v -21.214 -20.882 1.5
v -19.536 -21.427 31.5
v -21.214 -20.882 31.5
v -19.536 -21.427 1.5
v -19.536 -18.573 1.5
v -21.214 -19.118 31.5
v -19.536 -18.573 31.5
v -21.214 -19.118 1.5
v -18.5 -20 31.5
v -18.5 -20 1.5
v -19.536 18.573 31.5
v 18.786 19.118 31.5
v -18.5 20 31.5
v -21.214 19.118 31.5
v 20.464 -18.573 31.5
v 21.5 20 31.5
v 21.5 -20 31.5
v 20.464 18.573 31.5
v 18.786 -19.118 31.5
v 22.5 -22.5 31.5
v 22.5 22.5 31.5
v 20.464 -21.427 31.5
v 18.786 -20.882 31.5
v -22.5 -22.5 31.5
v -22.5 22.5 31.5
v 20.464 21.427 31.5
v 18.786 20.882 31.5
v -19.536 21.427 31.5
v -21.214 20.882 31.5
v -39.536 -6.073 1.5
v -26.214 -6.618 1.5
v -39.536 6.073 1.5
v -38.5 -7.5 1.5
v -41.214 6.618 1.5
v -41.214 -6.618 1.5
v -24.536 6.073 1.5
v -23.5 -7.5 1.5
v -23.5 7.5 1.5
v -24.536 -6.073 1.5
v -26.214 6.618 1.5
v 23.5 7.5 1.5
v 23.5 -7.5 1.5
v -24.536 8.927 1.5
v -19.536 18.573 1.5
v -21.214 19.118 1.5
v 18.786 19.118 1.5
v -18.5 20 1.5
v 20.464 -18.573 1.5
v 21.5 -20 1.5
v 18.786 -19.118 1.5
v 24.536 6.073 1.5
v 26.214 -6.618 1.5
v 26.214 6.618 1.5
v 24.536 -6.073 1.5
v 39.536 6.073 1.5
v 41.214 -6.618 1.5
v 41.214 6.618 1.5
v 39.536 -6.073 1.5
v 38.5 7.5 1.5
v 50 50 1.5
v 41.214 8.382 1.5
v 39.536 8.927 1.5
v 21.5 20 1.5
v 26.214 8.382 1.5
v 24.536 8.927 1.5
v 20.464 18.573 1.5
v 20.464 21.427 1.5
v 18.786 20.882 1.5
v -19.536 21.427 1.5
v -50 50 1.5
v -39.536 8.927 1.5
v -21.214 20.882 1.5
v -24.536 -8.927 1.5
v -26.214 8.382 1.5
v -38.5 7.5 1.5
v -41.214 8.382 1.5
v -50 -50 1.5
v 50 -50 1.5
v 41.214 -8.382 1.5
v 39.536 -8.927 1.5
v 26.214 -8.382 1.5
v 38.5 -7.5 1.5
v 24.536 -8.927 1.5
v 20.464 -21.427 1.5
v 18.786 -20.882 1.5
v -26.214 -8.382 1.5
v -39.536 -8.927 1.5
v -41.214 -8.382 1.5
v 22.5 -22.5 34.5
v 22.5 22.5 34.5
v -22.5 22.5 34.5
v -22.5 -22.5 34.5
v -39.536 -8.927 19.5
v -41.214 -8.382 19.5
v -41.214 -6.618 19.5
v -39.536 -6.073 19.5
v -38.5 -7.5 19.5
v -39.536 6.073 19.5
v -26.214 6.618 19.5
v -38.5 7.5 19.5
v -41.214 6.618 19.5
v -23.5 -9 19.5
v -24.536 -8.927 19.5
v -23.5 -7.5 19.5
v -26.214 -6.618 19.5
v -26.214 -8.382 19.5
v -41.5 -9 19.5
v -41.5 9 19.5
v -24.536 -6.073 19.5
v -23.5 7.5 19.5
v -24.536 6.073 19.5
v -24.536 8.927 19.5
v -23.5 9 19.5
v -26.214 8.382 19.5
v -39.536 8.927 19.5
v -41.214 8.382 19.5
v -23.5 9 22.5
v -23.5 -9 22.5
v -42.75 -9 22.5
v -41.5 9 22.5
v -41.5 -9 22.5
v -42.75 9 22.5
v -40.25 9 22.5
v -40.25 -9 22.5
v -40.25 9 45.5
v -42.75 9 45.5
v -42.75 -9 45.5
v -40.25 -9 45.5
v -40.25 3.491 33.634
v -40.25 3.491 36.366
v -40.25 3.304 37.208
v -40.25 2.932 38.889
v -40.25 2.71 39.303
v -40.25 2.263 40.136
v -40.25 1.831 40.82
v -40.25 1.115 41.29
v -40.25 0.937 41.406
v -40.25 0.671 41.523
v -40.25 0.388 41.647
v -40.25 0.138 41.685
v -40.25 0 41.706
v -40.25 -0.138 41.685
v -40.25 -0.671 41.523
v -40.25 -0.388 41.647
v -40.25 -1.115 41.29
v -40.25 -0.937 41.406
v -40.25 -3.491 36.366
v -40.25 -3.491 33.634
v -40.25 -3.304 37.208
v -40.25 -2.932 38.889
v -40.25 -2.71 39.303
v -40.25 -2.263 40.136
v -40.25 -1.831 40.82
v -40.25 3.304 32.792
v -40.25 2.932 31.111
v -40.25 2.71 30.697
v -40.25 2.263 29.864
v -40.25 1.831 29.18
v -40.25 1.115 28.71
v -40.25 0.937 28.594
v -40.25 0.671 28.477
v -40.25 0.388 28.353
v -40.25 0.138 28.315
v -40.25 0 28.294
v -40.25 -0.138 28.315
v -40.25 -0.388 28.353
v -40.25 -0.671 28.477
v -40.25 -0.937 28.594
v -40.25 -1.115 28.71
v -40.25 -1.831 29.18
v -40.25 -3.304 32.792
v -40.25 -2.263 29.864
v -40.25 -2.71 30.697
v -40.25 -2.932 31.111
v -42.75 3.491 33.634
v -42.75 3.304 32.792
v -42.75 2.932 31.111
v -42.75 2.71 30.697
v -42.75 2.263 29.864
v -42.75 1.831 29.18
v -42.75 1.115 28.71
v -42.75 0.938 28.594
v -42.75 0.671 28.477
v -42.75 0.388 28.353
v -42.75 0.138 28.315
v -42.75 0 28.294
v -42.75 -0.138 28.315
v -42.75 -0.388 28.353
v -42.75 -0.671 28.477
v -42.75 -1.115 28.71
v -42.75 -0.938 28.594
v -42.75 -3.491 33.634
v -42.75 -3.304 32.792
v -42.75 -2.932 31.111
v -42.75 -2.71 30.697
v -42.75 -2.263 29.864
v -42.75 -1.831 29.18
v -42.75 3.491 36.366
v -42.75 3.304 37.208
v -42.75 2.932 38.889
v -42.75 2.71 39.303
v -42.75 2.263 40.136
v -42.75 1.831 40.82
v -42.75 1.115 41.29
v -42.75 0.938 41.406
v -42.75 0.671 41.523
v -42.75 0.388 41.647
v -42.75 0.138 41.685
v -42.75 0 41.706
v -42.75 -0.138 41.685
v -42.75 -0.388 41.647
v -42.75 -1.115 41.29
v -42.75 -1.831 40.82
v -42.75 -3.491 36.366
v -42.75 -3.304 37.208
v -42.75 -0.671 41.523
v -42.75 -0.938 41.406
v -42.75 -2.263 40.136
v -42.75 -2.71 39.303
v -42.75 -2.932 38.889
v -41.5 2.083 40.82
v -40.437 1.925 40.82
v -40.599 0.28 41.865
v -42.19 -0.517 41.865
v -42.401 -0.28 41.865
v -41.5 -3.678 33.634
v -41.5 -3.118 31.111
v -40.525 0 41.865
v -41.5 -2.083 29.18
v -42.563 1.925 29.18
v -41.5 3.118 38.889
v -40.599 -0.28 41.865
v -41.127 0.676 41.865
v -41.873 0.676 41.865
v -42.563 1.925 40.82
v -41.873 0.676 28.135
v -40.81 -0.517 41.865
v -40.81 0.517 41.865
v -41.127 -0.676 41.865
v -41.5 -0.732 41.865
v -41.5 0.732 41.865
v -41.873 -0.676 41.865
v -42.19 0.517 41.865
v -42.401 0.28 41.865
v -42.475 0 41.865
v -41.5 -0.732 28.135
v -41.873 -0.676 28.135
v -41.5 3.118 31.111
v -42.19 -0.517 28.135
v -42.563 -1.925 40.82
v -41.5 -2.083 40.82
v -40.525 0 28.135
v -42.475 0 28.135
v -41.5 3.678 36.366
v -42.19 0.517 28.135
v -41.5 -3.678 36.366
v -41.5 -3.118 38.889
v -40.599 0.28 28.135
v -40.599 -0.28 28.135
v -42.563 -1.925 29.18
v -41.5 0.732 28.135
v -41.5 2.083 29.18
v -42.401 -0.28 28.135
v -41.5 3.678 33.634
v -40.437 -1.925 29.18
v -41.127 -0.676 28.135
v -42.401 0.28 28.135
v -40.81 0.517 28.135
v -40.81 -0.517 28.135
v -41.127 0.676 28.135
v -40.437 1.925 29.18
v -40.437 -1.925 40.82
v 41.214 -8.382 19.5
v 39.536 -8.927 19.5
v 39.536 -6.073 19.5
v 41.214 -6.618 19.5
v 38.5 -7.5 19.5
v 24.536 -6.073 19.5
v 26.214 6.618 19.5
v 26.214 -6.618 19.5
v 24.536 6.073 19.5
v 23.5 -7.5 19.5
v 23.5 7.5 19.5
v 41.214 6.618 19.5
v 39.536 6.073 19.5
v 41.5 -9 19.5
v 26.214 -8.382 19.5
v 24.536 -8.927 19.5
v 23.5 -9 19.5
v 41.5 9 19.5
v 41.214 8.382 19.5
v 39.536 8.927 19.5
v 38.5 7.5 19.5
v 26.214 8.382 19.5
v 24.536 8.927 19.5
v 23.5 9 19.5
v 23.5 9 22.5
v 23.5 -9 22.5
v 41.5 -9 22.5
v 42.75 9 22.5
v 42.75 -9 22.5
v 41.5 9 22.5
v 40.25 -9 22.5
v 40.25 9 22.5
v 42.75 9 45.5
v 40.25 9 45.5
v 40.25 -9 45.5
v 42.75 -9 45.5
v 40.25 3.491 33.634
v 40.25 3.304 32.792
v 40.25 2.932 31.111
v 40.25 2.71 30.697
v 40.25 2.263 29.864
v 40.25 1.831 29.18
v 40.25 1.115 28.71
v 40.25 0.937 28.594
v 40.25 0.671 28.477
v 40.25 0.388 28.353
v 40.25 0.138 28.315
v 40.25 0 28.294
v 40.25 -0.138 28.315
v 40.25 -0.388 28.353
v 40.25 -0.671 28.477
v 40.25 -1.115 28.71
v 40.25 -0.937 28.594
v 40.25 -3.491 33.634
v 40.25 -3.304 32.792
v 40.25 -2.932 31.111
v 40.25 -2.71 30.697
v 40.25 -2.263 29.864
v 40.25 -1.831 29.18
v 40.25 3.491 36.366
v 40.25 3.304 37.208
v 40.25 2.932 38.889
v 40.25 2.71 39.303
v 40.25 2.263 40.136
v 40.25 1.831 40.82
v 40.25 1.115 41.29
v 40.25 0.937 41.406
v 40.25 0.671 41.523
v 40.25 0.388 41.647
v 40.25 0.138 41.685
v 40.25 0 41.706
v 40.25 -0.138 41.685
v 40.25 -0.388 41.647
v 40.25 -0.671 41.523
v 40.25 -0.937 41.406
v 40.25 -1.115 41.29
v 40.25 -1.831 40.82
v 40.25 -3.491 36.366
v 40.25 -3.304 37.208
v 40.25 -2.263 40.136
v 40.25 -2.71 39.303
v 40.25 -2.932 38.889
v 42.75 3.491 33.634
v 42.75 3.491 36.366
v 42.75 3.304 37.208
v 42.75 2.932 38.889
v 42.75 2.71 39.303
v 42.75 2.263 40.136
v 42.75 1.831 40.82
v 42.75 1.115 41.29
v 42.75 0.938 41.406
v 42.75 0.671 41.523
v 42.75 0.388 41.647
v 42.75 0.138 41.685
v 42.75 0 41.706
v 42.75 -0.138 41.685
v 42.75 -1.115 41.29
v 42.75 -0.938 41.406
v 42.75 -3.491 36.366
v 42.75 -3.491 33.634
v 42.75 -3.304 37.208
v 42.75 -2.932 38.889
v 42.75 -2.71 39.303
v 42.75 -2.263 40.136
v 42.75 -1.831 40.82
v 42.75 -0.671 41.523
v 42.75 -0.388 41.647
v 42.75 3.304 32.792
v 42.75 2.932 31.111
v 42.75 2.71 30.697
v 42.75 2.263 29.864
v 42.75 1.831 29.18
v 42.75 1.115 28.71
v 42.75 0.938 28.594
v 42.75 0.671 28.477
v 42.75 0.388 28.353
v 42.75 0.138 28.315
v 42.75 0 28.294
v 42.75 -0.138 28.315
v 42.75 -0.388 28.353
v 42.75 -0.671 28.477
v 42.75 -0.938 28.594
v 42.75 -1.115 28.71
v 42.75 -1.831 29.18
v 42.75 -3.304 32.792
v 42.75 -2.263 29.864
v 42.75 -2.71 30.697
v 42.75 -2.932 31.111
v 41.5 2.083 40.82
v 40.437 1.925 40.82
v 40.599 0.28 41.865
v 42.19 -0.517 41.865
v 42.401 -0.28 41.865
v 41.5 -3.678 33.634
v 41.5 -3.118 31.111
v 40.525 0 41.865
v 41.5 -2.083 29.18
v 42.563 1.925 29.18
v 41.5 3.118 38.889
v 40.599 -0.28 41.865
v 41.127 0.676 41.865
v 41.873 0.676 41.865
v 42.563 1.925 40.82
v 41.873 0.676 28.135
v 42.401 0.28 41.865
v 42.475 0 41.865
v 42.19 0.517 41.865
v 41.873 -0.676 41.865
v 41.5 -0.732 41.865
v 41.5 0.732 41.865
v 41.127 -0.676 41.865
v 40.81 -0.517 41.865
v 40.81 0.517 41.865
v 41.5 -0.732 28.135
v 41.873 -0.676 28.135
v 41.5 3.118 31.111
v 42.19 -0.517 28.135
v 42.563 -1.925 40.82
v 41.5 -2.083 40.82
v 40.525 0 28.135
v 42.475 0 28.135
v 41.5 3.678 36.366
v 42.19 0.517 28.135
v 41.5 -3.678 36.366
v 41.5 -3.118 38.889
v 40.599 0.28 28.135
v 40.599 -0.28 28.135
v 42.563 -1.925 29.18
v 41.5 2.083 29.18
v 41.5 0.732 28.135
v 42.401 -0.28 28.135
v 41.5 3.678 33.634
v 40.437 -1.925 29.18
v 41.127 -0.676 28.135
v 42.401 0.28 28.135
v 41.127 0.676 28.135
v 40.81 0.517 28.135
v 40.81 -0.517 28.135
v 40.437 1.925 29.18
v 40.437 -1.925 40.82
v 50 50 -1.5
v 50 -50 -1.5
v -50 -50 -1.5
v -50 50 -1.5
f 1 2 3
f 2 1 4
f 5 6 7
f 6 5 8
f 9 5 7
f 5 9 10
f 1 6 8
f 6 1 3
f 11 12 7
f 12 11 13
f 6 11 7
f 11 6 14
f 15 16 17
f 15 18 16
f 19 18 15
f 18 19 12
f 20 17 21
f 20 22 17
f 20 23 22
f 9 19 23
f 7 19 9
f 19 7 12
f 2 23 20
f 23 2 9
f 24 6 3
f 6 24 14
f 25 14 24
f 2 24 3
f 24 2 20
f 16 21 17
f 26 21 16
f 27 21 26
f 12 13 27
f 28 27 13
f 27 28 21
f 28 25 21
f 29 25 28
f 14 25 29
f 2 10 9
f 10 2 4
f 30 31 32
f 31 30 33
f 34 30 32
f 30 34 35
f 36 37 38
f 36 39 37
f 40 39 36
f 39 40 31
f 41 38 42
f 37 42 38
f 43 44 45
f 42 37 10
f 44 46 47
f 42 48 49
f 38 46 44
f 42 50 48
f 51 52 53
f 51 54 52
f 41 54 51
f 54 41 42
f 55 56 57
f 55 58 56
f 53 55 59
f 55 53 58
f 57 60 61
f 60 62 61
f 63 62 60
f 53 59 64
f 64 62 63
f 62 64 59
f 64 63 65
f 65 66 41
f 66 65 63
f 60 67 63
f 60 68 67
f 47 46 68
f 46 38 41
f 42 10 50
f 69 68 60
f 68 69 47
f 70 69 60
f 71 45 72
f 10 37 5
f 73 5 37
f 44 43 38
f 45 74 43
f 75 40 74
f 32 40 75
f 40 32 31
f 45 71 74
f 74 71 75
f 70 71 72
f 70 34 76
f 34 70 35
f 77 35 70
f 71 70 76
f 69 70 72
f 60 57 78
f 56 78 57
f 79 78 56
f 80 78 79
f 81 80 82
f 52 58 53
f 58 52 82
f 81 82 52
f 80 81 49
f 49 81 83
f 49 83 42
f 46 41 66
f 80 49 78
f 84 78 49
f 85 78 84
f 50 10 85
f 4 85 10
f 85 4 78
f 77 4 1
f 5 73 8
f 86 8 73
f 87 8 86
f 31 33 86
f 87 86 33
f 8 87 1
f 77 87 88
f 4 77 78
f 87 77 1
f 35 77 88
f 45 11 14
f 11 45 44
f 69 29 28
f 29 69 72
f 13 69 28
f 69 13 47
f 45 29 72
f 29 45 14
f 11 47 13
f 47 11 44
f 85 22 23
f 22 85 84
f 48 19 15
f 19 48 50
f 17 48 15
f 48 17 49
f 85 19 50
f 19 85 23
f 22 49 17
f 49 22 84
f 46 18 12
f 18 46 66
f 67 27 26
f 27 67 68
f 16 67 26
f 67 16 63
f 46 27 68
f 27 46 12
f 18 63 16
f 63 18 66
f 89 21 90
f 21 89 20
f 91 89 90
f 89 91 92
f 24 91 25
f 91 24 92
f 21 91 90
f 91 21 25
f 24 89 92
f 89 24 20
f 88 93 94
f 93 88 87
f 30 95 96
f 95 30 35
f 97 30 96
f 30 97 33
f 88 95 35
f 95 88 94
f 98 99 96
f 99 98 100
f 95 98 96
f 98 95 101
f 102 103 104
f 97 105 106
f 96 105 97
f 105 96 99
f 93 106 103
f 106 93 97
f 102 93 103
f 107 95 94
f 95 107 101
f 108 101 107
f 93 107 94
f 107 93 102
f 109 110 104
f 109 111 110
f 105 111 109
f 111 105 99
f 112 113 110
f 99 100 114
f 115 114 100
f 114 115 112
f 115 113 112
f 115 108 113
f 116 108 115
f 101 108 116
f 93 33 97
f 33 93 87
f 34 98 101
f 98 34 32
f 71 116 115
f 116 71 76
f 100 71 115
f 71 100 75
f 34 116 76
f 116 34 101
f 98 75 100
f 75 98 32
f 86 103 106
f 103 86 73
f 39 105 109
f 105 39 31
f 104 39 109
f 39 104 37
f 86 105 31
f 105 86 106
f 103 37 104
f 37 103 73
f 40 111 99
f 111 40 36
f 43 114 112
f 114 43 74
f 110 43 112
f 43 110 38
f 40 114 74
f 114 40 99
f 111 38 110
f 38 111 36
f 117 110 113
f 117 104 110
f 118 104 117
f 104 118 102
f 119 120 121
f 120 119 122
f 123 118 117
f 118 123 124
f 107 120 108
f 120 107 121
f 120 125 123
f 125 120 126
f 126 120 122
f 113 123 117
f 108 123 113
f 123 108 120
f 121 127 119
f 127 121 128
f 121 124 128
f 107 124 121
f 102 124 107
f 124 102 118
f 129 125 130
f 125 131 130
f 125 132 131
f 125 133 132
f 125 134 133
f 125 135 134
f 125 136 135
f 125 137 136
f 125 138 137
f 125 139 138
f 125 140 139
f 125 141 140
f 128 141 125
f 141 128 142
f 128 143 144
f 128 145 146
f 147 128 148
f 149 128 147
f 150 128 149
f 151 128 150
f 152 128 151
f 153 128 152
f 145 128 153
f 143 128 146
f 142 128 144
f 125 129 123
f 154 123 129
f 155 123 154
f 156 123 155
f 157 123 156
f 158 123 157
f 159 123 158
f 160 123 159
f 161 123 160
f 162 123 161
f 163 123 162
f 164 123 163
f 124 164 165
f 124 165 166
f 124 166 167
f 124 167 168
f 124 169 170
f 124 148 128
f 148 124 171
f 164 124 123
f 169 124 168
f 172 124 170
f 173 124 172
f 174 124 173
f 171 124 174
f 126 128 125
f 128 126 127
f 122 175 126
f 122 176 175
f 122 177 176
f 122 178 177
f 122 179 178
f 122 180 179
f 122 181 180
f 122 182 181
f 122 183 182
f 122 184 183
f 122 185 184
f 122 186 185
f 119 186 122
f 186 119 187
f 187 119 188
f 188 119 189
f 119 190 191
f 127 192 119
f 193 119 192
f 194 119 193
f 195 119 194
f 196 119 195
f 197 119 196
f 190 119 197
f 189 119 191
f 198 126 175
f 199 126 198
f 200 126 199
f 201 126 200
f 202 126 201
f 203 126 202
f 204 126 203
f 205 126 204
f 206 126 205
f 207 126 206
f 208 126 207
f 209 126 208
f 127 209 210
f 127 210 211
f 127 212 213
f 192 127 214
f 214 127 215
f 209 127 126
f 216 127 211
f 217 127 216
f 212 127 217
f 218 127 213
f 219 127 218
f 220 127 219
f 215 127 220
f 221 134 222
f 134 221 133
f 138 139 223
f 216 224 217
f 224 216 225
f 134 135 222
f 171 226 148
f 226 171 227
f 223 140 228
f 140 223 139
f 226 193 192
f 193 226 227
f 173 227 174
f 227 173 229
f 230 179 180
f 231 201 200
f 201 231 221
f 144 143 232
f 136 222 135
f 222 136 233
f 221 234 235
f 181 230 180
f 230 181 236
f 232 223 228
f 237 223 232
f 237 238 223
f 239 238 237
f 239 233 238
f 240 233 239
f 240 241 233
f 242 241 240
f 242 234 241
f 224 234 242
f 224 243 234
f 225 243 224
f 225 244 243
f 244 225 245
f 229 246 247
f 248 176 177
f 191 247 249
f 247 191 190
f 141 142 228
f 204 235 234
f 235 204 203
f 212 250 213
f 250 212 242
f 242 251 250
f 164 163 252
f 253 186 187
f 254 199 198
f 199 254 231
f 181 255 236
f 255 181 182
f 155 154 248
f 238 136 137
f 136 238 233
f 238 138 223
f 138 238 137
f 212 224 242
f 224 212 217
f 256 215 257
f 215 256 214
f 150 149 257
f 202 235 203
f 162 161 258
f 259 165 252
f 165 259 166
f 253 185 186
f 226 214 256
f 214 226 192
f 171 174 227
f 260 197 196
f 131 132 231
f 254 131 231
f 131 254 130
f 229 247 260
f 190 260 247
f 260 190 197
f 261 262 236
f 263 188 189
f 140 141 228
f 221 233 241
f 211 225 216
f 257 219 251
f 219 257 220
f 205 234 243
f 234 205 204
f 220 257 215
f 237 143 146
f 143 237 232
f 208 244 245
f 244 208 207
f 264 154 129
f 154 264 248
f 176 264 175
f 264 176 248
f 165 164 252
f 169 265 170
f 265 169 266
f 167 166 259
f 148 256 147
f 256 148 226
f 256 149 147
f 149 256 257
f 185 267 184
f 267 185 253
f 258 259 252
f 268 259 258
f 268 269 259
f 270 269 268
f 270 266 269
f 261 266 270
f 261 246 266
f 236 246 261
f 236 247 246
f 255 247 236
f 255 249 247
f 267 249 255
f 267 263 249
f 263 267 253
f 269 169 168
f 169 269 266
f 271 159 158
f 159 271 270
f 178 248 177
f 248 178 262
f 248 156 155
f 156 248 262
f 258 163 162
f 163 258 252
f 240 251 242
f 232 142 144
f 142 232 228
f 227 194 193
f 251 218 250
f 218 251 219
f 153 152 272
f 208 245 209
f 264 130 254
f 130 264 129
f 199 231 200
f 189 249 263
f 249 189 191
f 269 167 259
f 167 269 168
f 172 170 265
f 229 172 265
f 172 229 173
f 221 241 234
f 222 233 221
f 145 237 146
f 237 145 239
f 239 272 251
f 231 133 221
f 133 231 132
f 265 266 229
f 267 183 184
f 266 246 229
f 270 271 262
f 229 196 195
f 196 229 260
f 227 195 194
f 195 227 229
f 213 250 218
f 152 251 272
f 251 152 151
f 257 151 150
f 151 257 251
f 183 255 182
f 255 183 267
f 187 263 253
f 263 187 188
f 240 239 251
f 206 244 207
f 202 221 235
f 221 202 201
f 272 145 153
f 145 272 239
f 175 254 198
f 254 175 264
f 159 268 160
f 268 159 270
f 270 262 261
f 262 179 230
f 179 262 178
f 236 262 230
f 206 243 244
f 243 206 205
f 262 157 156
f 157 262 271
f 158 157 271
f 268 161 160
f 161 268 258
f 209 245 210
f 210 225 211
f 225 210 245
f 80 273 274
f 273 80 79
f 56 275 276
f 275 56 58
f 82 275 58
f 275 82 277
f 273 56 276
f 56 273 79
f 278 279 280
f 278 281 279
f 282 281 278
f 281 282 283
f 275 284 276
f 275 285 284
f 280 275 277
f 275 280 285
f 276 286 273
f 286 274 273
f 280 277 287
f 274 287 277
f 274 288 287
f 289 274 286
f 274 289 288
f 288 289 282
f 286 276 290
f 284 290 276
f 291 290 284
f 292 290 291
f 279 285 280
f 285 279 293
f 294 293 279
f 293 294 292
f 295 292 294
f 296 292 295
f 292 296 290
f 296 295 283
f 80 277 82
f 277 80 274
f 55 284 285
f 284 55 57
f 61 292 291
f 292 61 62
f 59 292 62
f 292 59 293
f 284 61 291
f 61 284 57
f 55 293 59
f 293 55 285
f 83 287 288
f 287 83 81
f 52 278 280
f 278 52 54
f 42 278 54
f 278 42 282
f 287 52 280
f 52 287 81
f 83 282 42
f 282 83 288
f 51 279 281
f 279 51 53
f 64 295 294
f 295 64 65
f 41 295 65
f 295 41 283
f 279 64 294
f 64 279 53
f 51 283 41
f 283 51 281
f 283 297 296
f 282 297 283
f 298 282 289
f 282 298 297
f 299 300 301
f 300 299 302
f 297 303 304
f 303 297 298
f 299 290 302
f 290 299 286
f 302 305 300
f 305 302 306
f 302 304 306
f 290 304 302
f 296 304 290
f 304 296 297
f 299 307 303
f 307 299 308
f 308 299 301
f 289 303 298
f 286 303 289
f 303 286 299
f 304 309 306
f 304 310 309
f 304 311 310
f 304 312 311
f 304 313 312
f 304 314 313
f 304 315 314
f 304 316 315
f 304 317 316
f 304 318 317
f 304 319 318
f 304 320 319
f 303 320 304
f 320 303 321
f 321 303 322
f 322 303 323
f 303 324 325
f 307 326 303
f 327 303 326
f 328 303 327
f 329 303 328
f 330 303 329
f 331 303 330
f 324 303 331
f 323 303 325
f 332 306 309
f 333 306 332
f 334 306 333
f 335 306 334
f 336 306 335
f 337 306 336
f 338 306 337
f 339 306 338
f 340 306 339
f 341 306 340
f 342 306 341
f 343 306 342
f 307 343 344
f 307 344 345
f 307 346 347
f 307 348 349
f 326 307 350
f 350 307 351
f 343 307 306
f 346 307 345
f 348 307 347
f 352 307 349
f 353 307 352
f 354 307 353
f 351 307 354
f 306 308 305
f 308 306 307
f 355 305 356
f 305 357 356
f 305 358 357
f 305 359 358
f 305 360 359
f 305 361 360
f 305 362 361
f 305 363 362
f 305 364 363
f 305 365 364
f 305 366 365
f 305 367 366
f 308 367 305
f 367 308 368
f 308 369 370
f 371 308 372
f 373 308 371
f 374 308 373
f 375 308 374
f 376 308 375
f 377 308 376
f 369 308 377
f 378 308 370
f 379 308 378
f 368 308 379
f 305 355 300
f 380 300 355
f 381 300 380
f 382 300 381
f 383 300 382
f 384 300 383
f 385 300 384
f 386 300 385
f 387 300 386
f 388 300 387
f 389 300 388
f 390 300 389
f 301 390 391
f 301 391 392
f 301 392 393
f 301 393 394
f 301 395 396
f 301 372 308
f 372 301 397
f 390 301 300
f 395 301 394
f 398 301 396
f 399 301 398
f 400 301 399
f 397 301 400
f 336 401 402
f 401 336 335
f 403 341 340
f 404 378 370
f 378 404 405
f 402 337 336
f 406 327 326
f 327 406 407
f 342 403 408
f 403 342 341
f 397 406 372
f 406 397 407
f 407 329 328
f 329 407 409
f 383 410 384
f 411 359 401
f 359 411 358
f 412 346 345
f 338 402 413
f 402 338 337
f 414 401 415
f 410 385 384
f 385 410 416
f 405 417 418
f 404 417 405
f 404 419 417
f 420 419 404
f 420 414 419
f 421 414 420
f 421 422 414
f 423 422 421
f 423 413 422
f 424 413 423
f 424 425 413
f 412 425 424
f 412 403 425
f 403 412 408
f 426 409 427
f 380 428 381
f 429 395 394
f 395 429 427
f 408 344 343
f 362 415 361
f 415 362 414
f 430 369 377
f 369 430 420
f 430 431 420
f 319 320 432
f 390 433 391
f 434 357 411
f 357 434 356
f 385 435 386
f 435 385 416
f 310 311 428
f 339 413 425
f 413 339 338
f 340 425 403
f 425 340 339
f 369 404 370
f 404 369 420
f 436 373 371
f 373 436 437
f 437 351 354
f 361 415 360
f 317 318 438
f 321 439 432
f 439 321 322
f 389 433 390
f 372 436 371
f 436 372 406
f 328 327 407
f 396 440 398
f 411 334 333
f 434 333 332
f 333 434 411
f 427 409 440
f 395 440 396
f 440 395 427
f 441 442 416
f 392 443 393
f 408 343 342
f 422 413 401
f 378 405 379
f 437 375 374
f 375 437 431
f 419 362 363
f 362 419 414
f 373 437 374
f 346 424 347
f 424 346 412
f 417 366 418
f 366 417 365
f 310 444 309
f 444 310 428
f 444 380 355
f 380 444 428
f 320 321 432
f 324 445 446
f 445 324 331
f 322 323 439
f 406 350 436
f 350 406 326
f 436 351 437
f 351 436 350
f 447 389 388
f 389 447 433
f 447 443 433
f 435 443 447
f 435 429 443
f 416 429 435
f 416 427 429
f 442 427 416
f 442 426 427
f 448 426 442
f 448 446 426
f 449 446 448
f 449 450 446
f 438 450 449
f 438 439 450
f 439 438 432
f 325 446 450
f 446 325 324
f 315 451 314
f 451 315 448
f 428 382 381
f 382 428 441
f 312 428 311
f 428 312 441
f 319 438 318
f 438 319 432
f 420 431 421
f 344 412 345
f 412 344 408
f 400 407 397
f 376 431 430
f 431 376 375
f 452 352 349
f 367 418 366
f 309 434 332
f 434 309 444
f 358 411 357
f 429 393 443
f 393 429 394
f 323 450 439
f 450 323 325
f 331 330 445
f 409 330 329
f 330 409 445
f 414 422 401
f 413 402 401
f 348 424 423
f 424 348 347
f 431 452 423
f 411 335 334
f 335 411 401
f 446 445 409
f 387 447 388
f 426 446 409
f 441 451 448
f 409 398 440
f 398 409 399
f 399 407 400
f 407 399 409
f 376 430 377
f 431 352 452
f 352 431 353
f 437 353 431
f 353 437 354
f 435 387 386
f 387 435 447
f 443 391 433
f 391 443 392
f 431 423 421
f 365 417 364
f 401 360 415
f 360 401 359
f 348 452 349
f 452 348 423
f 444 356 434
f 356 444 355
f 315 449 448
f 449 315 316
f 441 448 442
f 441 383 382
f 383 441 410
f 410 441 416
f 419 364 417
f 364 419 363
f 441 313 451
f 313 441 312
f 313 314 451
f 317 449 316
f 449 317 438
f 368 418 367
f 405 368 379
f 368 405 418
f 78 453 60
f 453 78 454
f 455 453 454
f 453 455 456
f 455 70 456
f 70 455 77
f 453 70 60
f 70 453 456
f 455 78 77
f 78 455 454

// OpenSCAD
// file: libreriamuebles.scad
module piso()
{
    cube([100,100,3], center=true);
}

module mesa()
{
    //30 pulgadas es el tamano normal de un mesa
    //primer pierna
    translate([-20,-20,1.5])cylinder(h=30,r=1.5);
    //segunda pierna
    translate([-20,20,1.5])cylinder(h=30,r=1.5);
    //tercera pierna
    translate([20,-20,1.5])cylinder(h=30,r=1.5);
    //cuarta pierna
    translate([20,20,1.5])cylinder(h=30,r=1.5);
    
    //tapa de la mesa
    //altura mitad piso(z) + mitad mesa(z) + altura pata
    translate([0,0,33])cube([45,45,3],center=true);
}

module sillaBase()
{
    translate([-40,-7.5,1.5])cylinder(h=18,r=1.5);
    
    translate([-40,7.5,1.5])cylinder(h=18,r=1.5);
    
    translate([-25,-7.5,1.5])cylinder(h=18,r=1.5);
    
    translate([-25,7.5,1.5])cylinder(h=18,r=1.5);
    
    //altura mitad piso(z) + mitad mesa(z) + altura pata
    translate([-32.5,0,21])cube([18,18,3],center=true);
}

module espaldar()
{
    difference(){
    translate([-41.5,0,34])cube([2.5,18,23],center=true);
    translate([-41.5,0,35])scale([1,.75,1.4])sphere(5);     
    }
}

module silla()
{
        sillaBase();
        espaldar();
}

silla();
// main file
//Alfredo Alvarez
// Escena de piso mesa y silla o posibles sillas
use <libreriamuebles.scad>;

piso();
mesa();
silla();
mirror([1,0,0])silla();
